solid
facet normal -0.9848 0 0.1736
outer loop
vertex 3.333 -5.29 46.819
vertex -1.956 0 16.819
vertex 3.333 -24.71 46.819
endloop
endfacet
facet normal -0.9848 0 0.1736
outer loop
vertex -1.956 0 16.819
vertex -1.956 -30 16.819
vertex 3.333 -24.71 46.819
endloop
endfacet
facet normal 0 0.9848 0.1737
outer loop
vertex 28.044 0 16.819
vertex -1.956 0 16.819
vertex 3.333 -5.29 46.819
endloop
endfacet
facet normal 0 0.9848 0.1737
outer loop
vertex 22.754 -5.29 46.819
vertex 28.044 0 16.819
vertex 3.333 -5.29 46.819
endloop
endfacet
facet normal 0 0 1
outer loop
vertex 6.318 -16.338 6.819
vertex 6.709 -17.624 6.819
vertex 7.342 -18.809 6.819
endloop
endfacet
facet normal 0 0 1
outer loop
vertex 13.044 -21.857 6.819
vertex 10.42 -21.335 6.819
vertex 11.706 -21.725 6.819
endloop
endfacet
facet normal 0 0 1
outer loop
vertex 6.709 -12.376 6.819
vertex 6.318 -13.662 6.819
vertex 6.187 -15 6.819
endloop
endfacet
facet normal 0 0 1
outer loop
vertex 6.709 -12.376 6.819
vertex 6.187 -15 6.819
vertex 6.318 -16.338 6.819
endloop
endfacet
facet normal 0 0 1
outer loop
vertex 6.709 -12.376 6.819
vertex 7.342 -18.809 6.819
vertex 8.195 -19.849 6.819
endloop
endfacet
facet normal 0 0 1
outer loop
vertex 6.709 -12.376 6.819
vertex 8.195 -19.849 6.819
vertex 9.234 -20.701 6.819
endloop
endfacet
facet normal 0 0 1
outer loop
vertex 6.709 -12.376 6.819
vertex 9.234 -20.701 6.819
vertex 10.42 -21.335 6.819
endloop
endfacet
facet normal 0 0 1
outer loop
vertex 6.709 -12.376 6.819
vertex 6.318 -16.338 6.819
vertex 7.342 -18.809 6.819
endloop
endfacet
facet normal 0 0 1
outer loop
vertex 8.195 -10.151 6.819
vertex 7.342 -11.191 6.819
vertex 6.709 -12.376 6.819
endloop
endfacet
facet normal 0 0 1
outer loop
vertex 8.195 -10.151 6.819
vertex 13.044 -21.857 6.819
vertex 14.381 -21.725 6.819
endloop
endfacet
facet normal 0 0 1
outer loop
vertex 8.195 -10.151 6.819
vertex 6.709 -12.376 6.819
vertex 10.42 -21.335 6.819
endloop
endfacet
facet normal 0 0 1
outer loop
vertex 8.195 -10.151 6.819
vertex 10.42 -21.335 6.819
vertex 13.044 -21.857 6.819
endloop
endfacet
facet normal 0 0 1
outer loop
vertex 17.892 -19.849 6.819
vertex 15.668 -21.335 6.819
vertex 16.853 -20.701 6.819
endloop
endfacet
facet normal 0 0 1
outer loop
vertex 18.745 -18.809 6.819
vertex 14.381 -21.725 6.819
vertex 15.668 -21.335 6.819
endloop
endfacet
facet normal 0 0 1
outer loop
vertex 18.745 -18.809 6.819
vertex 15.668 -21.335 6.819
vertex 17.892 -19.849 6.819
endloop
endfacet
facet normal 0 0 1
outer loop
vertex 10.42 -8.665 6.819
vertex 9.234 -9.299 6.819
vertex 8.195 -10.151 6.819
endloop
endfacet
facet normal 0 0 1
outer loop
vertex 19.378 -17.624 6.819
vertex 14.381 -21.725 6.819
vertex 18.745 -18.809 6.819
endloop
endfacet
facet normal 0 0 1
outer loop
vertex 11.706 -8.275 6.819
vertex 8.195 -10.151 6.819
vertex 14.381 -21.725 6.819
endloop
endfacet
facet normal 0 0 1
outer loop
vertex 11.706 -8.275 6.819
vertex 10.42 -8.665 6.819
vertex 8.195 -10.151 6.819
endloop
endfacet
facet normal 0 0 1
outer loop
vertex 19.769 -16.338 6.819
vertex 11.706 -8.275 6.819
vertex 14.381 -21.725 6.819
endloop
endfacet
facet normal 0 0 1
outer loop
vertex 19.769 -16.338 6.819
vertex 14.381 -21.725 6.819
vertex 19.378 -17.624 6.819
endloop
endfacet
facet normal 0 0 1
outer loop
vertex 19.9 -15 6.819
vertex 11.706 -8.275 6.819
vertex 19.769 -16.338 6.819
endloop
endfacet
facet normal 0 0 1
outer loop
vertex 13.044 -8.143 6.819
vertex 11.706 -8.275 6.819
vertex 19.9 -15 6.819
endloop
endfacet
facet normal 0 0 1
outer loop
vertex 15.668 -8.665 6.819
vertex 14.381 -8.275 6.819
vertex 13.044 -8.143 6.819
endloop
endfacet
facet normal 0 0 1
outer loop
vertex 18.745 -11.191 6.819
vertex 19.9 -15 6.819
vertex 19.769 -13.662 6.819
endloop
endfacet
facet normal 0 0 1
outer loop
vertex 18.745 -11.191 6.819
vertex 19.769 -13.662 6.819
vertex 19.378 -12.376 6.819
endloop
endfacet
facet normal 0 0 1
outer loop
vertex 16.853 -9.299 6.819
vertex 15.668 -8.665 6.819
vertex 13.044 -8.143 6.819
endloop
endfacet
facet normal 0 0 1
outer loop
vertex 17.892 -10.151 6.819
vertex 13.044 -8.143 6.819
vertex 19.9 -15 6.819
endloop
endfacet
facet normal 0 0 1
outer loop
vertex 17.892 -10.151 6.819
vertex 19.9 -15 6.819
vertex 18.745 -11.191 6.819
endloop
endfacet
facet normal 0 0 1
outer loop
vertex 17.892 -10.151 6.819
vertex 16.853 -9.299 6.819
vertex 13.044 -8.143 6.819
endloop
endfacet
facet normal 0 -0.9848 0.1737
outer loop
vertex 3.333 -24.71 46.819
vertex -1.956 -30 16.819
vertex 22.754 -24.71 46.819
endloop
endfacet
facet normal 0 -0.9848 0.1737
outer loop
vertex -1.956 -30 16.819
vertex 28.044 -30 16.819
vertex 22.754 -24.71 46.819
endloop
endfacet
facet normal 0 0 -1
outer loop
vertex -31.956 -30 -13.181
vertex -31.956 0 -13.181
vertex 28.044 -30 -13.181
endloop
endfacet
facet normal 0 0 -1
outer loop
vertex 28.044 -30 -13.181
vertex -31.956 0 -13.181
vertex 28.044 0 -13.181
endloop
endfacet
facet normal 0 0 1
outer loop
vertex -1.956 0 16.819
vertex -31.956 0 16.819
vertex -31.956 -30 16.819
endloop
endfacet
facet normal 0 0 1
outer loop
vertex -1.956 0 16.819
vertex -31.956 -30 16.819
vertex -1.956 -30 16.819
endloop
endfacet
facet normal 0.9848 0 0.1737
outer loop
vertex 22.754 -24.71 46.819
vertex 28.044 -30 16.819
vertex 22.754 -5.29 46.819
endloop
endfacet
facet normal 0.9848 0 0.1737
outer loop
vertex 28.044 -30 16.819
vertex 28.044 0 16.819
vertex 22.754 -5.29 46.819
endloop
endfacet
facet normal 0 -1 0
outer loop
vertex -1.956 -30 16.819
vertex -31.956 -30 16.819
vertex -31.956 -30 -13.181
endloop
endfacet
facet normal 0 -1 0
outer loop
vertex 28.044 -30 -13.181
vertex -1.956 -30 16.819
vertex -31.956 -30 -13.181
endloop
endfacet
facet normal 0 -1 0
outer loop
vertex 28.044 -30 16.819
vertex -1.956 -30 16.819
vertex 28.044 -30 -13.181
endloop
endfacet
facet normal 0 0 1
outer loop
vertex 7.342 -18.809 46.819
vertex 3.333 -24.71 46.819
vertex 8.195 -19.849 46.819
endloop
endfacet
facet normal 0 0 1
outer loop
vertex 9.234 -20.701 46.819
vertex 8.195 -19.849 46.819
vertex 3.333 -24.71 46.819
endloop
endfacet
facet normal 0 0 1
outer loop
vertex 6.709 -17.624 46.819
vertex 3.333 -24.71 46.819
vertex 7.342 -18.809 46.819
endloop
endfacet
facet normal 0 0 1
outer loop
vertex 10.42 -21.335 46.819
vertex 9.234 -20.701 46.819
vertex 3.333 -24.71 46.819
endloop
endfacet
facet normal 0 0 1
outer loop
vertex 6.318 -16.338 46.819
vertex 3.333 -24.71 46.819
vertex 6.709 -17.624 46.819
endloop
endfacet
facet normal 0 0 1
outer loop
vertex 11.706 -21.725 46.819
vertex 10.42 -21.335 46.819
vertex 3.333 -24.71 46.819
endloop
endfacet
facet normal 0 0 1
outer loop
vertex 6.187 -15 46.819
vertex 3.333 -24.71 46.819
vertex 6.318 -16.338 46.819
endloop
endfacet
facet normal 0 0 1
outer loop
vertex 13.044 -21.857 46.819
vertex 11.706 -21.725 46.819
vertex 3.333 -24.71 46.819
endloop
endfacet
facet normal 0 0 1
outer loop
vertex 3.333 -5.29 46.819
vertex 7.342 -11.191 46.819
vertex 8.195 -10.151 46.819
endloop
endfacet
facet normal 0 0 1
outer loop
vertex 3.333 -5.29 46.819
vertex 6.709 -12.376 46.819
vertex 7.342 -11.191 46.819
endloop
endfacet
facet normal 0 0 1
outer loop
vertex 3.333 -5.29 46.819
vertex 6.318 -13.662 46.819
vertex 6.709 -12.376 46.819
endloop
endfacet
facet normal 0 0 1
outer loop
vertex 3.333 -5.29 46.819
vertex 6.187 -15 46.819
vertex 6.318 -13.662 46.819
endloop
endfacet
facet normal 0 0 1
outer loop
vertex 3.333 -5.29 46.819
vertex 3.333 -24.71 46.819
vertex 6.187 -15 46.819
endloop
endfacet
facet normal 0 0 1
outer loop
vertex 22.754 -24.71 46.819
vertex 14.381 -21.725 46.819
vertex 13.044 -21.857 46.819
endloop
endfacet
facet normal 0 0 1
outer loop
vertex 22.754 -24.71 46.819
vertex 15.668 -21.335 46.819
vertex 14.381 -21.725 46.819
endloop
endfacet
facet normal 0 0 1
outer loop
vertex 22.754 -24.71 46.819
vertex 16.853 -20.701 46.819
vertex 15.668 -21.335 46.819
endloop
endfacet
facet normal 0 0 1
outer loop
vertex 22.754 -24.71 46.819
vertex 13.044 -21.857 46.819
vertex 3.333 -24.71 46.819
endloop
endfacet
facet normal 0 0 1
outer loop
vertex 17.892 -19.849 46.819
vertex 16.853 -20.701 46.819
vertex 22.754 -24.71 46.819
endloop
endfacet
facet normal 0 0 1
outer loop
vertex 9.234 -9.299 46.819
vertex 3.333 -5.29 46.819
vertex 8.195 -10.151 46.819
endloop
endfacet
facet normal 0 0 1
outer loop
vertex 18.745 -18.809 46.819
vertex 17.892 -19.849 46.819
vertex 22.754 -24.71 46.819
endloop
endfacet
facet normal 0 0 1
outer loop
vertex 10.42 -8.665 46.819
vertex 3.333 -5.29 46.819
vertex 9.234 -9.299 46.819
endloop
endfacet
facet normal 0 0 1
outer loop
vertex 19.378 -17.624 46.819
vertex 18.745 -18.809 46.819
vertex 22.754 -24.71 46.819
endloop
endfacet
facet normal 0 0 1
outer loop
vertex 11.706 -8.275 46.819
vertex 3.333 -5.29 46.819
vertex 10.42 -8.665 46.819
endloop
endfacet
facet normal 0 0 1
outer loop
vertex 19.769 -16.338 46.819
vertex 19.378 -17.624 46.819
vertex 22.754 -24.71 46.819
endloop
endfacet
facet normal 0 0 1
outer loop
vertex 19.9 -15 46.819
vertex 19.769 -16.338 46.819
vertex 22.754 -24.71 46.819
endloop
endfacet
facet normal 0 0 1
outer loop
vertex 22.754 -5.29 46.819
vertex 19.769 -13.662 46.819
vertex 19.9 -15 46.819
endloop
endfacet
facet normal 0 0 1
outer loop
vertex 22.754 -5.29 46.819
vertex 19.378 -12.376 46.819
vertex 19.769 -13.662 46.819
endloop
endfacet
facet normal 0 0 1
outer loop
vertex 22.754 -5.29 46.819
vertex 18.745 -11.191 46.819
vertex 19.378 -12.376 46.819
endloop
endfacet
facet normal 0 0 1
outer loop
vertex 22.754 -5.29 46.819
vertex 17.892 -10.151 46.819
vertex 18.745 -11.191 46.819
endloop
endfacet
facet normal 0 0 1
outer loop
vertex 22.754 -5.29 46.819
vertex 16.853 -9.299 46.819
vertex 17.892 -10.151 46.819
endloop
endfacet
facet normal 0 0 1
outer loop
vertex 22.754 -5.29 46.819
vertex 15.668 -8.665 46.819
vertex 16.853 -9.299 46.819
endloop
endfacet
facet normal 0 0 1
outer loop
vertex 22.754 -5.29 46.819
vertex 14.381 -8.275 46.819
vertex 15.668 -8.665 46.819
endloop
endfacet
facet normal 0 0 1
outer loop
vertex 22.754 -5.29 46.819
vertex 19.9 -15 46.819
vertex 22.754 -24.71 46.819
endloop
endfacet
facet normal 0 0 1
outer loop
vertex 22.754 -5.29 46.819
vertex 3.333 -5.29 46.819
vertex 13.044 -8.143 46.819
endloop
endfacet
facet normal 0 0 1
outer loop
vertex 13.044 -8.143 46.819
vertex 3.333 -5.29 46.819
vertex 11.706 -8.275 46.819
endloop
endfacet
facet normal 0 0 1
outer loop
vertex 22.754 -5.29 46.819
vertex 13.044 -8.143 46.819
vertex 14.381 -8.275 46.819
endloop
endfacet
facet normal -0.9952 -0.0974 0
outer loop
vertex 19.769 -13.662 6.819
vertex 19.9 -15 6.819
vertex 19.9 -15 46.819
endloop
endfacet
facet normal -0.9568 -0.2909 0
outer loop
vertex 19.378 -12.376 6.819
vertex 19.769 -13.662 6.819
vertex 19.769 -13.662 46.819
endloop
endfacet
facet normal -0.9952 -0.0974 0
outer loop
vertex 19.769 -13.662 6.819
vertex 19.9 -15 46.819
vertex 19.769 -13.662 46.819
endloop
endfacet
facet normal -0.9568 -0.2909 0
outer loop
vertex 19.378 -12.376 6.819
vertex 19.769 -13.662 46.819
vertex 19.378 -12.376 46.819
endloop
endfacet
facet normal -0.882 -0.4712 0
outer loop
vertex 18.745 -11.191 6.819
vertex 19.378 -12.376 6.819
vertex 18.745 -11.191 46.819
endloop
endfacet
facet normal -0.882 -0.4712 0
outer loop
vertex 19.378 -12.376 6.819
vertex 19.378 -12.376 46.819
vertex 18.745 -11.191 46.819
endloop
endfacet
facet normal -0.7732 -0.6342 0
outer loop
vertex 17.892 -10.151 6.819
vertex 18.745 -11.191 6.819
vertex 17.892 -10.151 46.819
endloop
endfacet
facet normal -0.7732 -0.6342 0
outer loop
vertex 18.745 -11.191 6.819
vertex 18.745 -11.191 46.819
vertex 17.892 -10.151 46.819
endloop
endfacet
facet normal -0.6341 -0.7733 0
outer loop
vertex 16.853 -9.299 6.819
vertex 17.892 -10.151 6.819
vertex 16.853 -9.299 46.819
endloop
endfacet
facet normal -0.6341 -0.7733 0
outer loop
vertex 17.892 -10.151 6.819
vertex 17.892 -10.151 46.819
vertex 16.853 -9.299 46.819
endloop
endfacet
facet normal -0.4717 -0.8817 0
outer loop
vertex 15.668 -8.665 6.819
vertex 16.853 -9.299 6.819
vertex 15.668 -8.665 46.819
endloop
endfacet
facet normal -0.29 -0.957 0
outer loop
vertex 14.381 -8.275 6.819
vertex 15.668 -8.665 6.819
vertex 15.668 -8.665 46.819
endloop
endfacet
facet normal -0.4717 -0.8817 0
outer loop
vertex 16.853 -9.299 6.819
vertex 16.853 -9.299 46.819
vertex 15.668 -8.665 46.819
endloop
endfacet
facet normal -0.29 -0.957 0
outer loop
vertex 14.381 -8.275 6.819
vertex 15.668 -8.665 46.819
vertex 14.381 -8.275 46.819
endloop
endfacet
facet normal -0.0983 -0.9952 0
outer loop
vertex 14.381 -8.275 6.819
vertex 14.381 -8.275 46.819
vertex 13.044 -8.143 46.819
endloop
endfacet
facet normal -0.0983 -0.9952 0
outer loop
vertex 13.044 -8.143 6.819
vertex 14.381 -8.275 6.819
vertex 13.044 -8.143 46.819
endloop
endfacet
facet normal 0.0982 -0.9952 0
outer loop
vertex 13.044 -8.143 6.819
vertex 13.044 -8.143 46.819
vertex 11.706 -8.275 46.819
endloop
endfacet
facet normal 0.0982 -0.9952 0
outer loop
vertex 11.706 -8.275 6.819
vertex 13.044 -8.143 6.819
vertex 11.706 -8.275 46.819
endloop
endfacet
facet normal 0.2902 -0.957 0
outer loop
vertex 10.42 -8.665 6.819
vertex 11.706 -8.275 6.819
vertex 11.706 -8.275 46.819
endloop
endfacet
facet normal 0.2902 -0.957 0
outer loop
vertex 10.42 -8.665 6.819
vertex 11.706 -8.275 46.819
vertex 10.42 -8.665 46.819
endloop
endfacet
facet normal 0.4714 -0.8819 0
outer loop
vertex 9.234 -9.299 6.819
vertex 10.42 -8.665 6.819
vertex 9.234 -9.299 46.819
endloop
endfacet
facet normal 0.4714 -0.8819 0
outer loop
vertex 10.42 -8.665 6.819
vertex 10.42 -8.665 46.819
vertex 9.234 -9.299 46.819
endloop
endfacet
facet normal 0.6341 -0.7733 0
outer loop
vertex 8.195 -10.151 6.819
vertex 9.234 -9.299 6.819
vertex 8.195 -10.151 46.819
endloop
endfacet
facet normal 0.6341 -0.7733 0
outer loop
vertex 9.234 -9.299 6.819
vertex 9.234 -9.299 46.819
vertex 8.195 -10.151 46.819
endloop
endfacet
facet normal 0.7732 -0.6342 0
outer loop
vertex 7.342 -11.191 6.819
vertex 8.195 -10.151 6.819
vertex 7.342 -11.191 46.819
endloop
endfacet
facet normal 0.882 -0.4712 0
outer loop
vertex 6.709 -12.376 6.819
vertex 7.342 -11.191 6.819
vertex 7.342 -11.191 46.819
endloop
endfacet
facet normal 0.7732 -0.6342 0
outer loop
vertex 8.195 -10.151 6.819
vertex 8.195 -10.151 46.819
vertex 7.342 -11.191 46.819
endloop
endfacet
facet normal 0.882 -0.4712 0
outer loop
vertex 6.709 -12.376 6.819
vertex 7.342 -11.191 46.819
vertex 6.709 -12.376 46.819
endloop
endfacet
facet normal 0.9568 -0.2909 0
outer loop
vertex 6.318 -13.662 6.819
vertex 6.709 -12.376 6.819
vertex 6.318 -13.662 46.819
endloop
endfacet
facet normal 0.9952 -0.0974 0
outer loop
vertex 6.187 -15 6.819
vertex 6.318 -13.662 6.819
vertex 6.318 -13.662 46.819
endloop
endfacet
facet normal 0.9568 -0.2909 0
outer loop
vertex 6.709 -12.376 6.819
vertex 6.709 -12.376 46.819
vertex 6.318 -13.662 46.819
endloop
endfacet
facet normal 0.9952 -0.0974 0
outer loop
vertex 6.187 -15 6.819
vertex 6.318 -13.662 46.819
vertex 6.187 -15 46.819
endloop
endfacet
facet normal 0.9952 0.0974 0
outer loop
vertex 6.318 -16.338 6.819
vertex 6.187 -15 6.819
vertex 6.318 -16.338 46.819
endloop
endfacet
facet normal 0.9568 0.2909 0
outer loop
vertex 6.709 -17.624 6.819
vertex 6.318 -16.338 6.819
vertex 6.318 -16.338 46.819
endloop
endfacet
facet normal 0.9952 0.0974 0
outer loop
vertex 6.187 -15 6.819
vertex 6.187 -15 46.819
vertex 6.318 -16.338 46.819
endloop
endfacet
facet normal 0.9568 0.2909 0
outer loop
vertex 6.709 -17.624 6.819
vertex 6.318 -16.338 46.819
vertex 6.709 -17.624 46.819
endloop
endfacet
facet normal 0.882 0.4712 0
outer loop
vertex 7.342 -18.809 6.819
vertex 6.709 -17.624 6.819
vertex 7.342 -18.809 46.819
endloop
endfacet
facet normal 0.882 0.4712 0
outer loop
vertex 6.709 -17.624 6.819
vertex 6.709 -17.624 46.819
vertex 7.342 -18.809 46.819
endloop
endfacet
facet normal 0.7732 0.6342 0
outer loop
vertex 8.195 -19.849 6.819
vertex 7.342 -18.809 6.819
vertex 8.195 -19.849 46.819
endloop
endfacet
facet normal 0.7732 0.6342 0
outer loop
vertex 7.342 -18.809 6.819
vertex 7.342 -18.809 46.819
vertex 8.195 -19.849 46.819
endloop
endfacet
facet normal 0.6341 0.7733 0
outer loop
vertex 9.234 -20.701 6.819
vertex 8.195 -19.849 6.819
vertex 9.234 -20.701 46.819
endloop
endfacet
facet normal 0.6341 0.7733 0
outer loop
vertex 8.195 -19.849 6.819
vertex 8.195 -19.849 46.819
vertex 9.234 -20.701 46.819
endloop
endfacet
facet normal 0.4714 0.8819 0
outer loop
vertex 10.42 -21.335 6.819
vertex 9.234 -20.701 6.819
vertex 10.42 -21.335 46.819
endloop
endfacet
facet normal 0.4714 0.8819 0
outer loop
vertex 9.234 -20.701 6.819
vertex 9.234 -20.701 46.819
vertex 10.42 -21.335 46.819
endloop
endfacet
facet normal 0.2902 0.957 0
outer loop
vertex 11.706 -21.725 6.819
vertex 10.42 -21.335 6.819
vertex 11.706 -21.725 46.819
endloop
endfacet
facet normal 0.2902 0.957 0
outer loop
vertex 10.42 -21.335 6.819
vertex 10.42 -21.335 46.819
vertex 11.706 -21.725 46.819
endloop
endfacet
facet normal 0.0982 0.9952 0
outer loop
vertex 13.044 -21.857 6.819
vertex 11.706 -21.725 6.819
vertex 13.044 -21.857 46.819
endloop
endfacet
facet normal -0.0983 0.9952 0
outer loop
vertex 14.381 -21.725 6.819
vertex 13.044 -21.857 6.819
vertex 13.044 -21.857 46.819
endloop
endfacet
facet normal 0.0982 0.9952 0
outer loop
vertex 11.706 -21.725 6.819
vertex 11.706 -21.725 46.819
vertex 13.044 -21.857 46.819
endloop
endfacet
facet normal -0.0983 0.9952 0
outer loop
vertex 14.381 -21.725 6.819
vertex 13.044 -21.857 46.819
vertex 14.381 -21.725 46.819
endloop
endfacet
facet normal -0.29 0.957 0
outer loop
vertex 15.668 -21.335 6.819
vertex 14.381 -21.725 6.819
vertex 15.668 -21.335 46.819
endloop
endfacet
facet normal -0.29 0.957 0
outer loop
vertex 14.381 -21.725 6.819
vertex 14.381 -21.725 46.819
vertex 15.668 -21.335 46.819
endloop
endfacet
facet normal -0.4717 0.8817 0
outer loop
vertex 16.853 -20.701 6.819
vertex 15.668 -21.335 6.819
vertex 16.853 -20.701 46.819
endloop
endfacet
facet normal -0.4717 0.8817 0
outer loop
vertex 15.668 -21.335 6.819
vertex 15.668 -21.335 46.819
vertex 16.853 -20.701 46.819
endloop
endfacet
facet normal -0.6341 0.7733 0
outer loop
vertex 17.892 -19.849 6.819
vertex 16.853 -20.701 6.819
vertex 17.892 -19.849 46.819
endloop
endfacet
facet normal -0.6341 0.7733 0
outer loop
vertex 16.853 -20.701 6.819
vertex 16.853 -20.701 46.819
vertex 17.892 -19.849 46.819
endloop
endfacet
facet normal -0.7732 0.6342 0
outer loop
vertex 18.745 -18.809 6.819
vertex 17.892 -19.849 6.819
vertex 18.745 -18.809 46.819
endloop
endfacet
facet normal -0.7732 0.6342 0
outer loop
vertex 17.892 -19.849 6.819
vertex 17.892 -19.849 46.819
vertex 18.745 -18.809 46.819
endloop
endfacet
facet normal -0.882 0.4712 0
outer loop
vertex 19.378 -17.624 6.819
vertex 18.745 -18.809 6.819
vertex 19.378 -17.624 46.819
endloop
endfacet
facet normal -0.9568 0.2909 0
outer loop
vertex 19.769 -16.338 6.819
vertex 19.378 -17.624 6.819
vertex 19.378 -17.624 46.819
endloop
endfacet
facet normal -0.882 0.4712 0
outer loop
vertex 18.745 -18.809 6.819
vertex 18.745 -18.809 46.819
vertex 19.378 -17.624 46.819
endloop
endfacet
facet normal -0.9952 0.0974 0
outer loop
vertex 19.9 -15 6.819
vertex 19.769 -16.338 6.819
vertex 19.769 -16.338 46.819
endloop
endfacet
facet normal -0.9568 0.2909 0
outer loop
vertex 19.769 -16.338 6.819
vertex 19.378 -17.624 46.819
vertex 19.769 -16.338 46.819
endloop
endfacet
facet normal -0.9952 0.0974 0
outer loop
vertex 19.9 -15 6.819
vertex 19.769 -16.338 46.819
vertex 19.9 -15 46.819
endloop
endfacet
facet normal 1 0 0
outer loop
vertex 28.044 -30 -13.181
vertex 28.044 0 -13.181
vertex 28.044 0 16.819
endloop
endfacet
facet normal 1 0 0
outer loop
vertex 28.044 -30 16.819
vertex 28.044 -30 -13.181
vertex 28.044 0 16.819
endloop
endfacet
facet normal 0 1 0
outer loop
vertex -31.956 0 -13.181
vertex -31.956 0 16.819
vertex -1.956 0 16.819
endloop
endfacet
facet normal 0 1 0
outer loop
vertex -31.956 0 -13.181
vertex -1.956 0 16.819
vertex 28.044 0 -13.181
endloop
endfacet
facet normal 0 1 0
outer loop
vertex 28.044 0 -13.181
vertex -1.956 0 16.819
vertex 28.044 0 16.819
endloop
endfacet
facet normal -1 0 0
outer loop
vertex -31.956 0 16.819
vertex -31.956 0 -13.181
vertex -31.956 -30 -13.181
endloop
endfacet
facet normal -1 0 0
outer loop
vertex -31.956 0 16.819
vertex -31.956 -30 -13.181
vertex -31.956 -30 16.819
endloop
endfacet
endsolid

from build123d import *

# Parameters (mm, degrees)
F0_W     = 60
F0_H     = 30
F1_DEPTH = 30
F2_W     = 30
F2_H     = 30
F3_DEPTH = 30
F3_TAPER = 10
F4_R     = 6.8568709116
F5_DEPTH = 40


with BuildPart() as f1:
    # F0 (on Front) → F1 (new body)
    with BuildSketch(Plane.XZ):
        with Locations((-1.9564672485, 1.8185370226)):
            Rectangle(F0_W, F0_H)
    extrude(amount=F1_DEPTH)

    # F2 (on face) → F3 (join)
    with BuildSketch(Plane.XY.offset(16.8185370226)):
        with Locations((13.0435327515, -15)):
            Rectangle(F2_W, F2_H)
    extrude(amount=F3_DEPTH, taper=F3_TAPER)

    # F4 (on face) → F5 (cut)
    with BuildSketch(Plane.XY.offset(46.8185370226)):
        with Locations((13.0435327515, -15)):
            Circle(F4_R)
    extrude(amount=-F5_DEPTH, mode=Mode.SUBTRACT)


solid = f1.part
